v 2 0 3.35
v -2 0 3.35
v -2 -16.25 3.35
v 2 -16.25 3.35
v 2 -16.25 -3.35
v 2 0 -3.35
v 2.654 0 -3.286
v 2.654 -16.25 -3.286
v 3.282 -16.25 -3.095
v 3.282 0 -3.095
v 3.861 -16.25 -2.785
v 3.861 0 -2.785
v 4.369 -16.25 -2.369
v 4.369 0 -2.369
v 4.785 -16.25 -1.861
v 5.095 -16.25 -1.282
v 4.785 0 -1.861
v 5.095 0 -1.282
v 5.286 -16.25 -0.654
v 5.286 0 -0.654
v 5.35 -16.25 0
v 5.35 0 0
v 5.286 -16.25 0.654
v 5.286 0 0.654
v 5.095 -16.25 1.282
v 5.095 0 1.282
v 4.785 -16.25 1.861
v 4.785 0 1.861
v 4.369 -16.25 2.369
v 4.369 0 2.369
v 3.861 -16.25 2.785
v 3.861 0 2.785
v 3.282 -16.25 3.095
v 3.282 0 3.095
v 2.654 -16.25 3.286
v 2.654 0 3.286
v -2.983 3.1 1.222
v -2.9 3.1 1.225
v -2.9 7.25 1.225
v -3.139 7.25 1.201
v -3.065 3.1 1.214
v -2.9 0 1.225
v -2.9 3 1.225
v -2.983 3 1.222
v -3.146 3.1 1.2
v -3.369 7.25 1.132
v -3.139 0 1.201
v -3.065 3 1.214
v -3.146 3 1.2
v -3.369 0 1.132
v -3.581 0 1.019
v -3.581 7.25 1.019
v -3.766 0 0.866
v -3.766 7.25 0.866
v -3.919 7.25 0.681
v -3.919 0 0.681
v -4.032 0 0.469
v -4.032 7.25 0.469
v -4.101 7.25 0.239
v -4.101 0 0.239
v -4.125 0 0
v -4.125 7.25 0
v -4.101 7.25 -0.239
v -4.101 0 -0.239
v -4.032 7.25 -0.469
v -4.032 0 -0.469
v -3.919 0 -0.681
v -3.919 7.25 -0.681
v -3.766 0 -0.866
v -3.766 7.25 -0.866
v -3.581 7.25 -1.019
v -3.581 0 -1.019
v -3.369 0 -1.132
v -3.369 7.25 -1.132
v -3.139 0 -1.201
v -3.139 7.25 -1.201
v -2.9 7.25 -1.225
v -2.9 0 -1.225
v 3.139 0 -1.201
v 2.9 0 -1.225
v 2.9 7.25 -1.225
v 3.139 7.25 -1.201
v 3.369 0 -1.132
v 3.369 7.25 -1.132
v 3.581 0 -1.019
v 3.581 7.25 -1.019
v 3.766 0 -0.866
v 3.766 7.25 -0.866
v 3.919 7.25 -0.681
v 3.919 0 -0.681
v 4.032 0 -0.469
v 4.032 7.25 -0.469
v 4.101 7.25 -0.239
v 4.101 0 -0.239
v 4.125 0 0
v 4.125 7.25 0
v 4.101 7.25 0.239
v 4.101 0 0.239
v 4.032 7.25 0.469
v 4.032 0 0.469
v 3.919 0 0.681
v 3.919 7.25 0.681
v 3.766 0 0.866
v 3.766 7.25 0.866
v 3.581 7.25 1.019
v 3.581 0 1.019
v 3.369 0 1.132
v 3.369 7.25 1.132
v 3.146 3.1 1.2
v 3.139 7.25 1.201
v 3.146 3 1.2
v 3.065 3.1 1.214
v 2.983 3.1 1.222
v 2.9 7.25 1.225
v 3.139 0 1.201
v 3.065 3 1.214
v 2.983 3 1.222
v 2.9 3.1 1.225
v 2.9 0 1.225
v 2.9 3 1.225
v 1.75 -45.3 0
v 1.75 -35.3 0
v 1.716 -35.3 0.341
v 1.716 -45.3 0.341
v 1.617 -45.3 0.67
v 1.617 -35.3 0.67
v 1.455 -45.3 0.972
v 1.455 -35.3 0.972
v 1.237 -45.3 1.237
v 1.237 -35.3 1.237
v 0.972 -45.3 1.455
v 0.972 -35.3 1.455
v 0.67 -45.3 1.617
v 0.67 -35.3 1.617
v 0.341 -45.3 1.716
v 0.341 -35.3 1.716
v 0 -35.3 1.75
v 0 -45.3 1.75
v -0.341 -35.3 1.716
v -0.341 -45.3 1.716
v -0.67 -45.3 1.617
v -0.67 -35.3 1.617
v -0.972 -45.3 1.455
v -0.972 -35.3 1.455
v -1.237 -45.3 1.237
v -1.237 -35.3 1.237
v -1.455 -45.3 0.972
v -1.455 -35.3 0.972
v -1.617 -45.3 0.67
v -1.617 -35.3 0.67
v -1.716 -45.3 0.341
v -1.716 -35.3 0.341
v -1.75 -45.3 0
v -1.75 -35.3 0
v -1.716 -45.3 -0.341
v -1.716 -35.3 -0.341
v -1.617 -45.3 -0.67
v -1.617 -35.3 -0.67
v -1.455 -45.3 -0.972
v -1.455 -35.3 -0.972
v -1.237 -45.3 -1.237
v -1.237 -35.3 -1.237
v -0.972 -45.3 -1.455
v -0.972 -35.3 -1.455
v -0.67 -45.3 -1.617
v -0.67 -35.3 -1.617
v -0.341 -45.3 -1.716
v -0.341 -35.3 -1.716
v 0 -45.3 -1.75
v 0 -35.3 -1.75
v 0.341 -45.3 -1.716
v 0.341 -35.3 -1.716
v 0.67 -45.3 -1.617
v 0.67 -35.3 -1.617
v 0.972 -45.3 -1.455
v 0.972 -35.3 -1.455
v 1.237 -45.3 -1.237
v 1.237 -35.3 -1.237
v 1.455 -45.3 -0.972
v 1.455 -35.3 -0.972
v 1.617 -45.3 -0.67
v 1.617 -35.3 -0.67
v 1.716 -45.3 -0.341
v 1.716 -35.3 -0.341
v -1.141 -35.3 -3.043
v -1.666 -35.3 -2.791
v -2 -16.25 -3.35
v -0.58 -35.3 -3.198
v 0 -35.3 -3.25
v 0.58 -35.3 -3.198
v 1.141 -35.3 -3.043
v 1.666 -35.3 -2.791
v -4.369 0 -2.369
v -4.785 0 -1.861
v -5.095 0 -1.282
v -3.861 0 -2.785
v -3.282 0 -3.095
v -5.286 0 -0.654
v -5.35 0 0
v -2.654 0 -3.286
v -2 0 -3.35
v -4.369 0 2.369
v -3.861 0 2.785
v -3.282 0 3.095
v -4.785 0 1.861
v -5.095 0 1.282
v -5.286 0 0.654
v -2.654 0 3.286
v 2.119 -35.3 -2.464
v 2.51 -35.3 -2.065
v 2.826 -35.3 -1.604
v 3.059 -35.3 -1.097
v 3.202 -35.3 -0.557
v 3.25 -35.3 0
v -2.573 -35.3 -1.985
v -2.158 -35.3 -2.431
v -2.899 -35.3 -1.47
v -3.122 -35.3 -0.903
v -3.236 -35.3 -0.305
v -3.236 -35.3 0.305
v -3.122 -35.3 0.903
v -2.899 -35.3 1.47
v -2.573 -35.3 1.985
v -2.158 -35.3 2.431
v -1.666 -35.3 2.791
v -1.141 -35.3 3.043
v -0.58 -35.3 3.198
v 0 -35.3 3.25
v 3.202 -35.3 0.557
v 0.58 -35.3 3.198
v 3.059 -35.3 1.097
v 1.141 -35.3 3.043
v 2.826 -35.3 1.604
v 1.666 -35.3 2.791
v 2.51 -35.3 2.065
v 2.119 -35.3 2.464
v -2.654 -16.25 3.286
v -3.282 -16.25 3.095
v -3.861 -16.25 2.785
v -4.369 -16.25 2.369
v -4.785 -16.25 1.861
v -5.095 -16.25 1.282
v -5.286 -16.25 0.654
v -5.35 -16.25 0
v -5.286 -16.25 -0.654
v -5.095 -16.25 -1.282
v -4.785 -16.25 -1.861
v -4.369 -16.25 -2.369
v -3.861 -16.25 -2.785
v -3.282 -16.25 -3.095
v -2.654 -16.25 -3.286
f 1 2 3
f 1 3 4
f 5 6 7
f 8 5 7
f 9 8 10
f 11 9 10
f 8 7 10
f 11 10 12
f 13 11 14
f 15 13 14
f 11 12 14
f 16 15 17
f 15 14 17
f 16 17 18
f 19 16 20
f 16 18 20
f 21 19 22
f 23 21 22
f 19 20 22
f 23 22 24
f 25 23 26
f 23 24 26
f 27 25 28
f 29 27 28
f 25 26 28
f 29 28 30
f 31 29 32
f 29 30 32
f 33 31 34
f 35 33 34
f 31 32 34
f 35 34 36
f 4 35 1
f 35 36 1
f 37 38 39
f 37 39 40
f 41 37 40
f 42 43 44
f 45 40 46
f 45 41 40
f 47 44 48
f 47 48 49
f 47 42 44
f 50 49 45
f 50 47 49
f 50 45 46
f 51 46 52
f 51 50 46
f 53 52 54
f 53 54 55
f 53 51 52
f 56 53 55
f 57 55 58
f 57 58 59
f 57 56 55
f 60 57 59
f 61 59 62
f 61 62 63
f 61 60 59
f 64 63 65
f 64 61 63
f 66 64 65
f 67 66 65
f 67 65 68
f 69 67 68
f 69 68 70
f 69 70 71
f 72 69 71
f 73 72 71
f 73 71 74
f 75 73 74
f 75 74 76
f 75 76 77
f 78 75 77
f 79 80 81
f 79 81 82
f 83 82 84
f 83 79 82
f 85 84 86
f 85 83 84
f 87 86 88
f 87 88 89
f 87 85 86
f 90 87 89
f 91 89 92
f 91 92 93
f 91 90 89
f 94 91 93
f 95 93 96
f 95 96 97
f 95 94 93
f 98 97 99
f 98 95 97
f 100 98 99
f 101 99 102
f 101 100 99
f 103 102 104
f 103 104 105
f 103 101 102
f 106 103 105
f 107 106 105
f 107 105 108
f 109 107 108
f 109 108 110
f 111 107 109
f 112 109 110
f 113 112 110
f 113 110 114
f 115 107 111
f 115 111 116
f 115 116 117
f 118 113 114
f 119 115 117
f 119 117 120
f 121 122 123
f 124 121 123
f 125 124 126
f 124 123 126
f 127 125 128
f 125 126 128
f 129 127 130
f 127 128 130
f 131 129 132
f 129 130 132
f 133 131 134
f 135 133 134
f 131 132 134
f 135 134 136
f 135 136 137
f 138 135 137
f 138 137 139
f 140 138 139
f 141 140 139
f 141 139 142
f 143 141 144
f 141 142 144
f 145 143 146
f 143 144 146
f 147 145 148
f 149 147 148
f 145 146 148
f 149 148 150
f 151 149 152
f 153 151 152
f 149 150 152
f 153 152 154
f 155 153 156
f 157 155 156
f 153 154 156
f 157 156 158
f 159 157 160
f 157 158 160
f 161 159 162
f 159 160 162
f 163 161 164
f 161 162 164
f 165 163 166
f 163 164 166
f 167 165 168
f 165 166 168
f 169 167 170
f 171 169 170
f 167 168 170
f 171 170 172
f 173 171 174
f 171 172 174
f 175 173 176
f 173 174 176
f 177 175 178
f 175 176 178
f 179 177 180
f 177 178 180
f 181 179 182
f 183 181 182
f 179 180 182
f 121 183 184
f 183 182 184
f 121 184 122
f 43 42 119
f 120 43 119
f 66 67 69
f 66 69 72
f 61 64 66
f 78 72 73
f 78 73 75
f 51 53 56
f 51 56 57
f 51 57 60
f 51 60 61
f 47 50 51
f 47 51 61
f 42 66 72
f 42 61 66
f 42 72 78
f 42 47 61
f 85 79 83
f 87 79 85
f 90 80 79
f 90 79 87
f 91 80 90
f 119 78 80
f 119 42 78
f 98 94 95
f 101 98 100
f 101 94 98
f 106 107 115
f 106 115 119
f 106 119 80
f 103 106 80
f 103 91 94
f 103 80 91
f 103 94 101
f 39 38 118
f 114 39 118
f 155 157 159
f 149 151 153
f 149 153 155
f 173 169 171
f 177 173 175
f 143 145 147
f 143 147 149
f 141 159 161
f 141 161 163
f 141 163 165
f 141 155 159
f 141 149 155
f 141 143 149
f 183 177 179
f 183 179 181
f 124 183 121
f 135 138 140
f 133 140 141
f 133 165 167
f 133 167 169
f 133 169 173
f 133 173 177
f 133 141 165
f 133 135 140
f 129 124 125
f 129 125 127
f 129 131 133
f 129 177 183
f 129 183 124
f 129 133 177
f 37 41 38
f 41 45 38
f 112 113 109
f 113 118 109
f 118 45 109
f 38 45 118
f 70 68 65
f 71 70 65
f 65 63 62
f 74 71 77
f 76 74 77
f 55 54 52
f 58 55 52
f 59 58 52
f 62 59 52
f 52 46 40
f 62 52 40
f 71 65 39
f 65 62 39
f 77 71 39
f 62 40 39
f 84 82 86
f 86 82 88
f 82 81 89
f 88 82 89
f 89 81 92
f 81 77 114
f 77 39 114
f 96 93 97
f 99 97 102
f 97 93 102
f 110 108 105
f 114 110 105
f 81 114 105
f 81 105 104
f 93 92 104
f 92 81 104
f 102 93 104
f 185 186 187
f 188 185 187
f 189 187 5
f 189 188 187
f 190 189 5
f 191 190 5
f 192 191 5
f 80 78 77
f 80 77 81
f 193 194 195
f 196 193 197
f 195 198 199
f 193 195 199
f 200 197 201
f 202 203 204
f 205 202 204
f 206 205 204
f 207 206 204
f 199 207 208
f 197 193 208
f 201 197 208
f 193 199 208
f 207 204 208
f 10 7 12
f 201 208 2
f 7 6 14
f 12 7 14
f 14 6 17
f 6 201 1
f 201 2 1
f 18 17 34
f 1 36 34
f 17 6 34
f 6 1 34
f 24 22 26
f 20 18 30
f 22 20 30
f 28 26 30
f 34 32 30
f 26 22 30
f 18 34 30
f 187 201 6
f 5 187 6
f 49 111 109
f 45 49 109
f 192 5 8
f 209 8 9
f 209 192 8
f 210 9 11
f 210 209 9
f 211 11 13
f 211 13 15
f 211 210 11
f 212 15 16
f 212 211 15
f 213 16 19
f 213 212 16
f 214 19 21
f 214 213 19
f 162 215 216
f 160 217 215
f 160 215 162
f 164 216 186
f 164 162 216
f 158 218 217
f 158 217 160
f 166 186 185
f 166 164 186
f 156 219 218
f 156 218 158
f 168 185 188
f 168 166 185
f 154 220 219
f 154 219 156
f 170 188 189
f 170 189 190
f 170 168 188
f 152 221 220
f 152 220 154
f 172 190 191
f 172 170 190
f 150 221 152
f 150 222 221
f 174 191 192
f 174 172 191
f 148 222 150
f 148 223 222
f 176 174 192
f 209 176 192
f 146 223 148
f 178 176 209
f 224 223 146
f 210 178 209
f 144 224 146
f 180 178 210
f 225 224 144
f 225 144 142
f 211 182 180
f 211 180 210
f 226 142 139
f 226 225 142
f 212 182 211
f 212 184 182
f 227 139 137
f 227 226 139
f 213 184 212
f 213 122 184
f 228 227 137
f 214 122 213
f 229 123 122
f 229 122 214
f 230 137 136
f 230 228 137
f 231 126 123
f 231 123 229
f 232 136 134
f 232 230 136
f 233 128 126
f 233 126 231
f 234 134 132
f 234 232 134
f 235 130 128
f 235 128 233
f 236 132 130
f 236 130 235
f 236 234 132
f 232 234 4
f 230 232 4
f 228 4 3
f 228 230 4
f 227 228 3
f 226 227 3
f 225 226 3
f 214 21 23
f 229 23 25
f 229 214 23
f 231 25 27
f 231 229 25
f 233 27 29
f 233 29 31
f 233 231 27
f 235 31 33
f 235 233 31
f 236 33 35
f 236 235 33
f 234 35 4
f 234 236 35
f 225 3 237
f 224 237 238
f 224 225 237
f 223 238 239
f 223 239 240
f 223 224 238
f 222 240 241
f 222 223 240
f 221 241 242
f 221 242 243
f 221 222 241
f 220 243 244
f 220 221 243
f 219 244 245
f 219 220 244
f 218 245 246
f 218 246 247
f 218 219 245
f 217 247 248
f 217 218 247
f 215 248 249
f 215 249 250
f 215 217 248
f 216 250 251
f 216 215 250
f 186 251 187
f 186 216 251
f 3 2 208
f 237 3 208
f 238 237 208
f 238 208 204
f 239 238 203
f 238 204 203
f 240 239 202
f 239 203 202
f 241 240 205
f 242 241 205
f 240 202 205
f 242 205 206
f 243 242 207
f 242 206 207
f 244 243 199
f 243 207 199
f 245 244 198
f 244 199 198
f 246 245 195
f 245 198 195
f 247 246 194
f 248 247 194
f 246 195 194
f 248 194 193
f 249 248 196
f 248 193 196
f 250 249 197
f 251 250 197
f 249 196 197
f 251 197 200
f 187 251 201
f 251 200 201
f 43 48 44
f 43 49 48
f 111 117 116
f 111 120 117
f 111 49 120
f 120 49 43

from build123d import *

# Parameters (mm, degrees)
PAD_DEPTH         = 16.25
SKETCH002_R       = 3.25
SKETCH003_R       = 1.75
PAD001_DEPTH      = 10
PAD002_DEPTH      = 7.25
SKETCH006_W       = 0.1
SKETCH006_H       = 10
POCKET_DEPTH      = 4.126
POCKET_DEPTH_BACK = -4.126


with BuildPart() as std_usbc_cable:
    # Sketch → Pad (new body)
    with BuildSketch(Plane.XZ):
        with BuildLine():
            ThreePointArc((-2, 3.35), (-5.35, 0), (-2, -3.35))
            Line((-2, -3.35), (2, -3.35))
            ThreePointArc((2, -3.35), (5.35, 0), (2, 3.35))
            Line((-2, 3.35), (2, 3.35))
        make_face()
    extrude(amount=PAD_DEPTH)

    # Sketch001 (on DatumPlane) → AdditiveLoft section 0
    with BuildSketch(Plane.XZ.offset(16.25)):
        with BuildLine():
            ThreePointArc((-2, 3.35), (-5.35, 0), (-2, -3.35))
            Line((-2, -3.35), (2, -3.35))
            ThreePointArc((2, -3.35), (5.35, 0), (2, 3.35))
            Line((-2, 3.35), (2, 3.35))
        make_face()
    # Sketch002 (on DatumPlane) → AdditiveLoft section 1
    with BuildSketch(Plane.XZ.offset(35.3)):
        Circle(SKETCH002_R)
    loft()

    # Sketch003 (on DatumPlane) → Pad001 (join)
    with BuildSketch(Plane.XZ.offset(35.3)):
        Circle(SKETCH003_R)
    extrude(amount=PAD001_DEPTH)


with BuildPart() as std_usbc_connector:
    # Sketch005 → Pad002 (new body)
    with BuildSketch(Plane.XZ):
        with BuildLine():
            ThreePointArc((-2.9, 1.225), (-4.125, 0), (-2.9, -1.225))
            Line((-2.9, -1.225), (2.9, -1.225))
            ThreePointArc((2.9, -1.225), (4.125, 0), (2.9, 1.225))
            Line((-2.9, 1.225), (2.9, 1.225))
        make_face()
    extrude(amount=-PAD002_DEPTH)

    # Sketch006 → Pocket (cut, two sides)
    with BuildSketch(Plane.YZ) as pocket_sk:
        with Locations((3.05, 6.2)):
            Rectangle(SKETCH006_W, SKETCH006_H)
    extrude(amount=-POCKET_DEPTH, mode=Mode.SUBTRACT)
    extrude(pocket_sk.sketch, amount=-POCKET_DEPTH_BACK, mode=Mode.SUBTRACT)


solid = Compound([std_usbc_cable.part, std_usbc_connector.part])
